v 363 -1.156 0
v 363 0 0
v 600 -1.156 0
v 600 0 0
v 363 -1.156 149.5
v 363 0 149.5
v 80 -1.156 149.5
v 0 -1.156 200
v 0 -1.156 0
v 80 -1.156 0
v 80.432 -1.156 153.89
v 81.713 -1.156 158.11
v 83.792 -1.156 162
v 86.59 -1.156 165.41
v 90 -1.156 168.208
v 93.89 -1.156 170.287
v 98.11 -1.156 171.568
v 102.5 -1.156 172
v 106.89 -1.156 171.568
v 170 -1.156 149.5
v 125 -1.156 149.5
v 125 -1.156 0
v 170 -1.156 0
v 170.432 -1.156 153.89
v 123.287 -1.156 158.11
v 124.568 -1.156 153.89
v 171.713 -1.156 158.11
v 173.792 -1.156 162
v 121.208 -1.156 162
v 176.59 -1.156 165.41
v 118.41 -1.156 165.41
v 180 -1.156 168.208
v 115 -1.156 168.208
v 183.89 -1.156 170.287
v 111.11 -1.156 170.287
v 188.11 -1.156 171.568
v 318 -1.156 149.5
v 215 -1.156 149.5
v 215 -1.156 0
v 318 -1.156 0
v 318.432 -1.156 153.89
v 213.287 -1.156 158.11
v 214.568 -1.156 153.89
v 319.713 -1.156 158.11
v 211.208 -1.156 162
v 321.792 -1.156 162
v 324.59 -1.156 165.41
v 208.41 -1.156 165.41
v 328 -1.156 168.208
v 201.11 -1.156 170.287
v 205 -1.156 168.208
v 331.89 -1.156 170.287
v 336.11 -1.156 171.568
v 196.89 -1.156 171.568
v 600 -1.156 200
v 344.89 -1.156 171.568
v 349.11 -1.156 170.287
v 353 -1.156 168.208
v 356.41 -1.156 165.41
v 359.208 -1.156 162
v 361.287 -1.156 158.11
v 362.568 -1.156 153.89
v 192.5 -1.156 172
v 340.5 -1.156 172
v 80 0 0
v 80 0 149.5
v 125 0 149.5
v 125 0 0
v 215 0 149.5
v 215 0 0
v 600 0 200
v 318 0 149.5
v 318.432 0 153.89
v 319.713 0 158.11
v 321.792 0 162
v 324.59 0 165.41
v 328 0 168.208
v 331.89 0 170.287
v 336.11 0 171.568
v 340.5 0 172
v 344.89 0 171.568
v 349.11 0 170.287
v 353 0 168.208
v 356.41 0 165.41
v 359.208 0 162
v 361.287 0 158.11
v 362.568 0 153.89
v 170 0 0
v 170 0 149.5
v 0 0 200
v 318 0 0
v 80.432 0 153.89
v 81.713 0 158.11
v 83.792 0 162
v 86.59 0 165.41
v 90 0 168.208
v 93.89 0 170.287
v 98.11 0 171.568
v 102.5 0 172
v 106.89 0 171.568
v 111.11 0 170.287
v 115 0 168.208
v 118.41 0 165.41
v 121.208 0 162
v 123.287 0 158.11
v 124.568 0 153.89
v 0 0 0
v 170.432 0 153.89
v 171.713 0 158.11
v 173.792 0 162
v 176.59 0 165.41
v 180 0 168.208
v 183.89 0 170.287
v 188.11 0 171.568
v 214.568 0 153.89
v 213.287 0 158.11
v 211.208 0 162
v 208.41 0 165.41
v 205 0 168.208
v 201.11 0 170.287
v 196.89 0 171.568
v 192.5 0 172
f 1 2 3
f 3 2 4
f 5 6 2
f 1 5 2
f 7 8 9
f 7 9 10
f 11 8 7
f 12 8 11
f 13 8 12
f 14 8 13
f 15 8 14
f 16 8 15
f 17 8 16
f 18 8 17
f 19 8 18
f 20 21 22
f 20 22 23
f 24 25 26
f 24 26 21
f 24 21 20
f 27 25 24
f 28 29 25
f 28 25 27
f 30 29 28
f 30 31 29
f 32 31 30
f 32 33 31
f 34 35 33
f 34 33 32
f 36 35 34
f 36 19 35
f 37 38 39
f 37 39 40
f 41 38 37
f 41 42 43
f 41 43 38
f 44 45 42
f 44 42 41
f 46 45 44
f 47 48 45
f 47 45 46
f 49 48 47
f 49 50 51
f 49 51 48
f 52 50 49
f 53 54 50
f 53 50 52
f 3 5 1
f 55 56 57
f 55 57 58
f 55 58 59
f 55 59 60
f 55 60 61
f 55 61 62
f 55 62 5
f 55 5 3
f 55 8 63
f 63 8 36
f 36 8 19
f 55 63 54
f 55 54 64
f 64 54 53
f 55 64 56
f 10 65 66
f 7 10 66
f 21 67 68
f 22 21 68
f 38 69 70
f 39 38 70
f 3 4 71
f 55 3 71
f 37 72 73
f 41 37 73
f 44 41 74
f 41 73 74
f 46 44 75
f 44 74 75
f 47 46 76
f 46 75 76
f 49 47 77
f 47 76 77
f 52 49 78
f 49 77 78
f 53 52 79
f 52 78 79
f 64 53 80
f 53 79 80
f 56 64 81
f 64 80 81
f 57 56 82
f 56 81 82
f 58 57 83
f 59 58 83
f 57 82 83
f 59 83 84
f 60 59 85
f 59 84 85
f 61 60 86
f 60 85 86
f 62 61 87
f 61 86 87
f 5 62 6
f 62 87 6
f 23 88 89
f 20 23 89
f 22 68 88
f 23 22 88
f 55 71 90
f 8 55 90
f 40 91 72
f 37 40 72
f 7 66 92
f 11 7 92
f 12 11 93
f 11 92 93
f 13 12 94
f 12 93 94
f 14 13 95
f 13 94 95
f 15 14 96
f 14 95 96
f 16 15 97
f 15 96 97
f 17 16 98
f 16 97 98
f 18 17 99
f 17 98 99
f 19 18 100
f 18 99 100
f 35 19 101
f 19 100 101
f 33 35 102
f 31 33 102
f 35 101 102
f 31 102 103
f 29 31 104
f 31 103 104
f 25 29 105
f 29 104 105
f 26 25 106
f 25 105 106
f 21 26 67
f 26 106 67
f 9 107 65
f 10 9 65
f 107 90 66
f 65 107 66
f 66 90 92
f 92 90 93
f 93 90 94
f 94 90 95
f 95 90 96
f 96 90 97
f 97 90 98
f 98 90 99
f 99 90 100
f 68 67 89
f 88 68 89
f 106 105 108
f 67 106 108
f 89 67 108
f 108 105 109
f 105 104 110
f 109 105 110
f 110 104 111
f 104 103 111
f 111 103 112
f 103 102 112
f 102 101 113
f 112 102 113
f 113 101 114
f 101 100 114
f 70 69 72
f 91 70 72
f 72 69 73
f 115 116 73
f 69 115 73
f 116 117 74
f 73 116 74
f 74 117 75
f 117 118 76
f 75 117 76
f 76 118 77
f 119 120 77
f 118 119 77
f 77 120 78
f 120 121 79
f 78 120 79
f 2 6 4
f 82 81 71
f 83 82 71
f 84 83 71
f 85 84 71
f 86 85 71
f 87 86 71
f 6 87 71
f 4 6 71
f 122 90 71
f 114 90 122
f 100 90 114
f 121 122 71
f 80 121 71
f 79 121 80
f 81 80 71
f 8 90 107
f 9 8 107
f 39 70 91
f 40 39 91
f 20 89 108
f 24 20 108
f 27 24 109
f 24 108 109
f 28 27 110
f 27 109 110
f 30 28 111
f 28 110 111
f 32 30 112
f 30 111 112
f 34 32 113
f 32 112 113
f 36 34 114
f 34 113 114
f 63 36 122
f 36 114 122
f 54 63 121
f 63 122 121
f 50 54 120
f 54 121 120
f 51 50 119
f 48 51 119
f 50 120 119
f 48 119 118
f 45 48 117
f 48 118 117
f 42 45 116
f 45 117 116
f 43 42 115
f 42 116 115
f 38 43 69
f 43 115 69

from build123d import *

# Parameters (mm, degrees)
F1_DEPTH = 1.1557


with BuildPart() as f1:
    # F0 (on Front) → F1 (new body)
    with BuildSketch(Plane.XZ):
        with BuildLine():
            Line((0, 200), (0, 0))
            Line((0, 0), (80, 0))
            Line((80, 0), (80, 149.5))
            ThreePointArc((80, 149.5), (102.5, 172), (125, 149.5))
            Line((125, 149.5), (125, 0))
            Line((125, 0), (170, 0))
            Line((170, 0), (170, 149.5))
            ThreePointArc((170, 149.5), (192.5, 172), (215, 149.5))
            Line((215, 149.5), (215, 0))
            Line((215, 0), (318, 0))
            Line((318, 0), (318, 149.5))
            ThreePointArc((318, 149.5), (340.5, 172), (363, 149.5))
            Line((363, 149.5), (363, 0))
            Line((363, 0), (600, 0))
            Line((600, 0), (600, 200))
            Line((600, 200), (0, 200))
        make_face()
    extrude(amount=F1_DEPTH)


solid = f1.part
